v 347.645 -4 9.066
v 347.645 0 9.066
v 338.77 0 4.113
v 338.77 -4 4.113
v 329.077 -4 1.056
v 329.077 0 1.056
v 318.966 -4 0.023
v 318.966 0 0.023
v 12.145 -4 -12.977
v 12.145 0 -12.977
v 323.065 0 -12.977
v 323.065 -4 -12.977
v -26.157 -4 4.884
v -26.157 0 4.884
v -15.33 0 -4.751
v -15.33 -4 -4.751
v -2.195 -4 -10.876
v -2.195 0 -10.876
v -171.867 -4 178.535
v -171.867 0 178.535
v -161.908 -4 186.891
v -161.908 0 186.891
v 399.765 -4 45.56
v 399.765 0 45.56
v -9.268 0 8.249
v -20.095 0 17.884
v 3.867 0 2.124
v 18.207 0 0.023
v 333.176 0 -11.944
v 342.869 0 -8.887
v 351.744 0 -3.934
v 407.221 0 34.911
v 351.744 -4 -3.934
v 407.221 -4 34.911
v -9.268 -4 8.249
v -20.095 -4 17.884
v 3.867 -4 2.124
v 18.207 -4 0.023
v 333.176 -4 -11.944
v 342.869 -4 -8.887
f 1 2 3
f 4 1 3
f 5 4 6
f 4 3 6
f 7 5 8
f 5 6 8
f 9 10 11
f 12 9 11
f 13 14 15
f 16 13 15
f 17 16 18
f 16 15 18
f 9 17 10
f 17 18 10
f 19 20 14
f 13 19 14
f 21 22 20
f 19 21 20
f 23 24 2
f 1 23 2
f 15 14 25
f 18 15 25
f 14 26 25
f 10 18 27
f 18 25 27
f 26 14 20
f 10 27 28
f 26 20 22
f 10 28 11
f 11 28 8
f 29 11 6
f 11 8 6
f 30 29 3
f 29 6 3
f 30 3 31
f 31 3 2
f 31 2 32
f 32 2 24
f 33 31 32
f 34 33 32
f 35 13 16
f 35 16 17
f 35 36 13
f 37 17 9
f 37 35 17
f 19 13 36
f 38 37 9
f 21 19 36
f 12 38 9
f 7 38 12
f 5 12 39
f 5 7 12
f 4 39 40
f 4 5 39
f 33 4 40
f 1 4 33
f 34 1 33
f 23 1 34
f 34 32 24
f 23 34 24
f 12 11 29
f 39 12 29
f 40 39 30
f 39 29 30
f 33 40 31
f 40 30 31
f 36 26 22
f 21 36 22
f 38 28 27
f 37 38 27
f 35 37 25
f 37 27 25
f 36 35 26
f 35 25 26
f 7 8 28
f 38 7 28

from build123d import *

# Parameters (mm, degrees)
F1_DEPTH = 4


with BuildPart() as f1:
    # F0 (on Front) → F1 (new body)
    with BuildSketch(Plane.XZ):
        with BuildLine():
            ThreePointArc((-26.156867, 4.884096), (-8.985558, -8.291913), (12.145355, -12.976524))
            Line((12.145355, -12.976524), (323.065033, -12.976524))
            ThreePointArc((323.065033, -12.976524), (338.100323, -10.662371), (351.743855, -3.934126))
            Line((351.743855, -3.934126), (407.221116, 34.911471))
            Line((407.221116, 34.911471), (399.764622, 45.560447))
            Line((399.764622, 45.560447), (347.64497, 9.065874))
            ThreePointArc((347.64497, 9.065874), (334.001439, 2.337629), (318.966149, 0.023476))
            Line((318.966149, 0.023476), (18.207355, 0.023476))
            ThreePointArc((18.207355, 0.023476), (-2.923558, 4.708087), (-20.094867, 17.884096))
            Line((-20.094867, 17.884096), (-161.908352, 186.890826))
            Line((-161.908352, 186.890826), (-171.86693, 178.534587))
            Line((-171.86693, 178.534587), (-26.156867, 4.884096))
        make_face()
    extrude(amount=F1_DEPTH)


solid = f1.part
